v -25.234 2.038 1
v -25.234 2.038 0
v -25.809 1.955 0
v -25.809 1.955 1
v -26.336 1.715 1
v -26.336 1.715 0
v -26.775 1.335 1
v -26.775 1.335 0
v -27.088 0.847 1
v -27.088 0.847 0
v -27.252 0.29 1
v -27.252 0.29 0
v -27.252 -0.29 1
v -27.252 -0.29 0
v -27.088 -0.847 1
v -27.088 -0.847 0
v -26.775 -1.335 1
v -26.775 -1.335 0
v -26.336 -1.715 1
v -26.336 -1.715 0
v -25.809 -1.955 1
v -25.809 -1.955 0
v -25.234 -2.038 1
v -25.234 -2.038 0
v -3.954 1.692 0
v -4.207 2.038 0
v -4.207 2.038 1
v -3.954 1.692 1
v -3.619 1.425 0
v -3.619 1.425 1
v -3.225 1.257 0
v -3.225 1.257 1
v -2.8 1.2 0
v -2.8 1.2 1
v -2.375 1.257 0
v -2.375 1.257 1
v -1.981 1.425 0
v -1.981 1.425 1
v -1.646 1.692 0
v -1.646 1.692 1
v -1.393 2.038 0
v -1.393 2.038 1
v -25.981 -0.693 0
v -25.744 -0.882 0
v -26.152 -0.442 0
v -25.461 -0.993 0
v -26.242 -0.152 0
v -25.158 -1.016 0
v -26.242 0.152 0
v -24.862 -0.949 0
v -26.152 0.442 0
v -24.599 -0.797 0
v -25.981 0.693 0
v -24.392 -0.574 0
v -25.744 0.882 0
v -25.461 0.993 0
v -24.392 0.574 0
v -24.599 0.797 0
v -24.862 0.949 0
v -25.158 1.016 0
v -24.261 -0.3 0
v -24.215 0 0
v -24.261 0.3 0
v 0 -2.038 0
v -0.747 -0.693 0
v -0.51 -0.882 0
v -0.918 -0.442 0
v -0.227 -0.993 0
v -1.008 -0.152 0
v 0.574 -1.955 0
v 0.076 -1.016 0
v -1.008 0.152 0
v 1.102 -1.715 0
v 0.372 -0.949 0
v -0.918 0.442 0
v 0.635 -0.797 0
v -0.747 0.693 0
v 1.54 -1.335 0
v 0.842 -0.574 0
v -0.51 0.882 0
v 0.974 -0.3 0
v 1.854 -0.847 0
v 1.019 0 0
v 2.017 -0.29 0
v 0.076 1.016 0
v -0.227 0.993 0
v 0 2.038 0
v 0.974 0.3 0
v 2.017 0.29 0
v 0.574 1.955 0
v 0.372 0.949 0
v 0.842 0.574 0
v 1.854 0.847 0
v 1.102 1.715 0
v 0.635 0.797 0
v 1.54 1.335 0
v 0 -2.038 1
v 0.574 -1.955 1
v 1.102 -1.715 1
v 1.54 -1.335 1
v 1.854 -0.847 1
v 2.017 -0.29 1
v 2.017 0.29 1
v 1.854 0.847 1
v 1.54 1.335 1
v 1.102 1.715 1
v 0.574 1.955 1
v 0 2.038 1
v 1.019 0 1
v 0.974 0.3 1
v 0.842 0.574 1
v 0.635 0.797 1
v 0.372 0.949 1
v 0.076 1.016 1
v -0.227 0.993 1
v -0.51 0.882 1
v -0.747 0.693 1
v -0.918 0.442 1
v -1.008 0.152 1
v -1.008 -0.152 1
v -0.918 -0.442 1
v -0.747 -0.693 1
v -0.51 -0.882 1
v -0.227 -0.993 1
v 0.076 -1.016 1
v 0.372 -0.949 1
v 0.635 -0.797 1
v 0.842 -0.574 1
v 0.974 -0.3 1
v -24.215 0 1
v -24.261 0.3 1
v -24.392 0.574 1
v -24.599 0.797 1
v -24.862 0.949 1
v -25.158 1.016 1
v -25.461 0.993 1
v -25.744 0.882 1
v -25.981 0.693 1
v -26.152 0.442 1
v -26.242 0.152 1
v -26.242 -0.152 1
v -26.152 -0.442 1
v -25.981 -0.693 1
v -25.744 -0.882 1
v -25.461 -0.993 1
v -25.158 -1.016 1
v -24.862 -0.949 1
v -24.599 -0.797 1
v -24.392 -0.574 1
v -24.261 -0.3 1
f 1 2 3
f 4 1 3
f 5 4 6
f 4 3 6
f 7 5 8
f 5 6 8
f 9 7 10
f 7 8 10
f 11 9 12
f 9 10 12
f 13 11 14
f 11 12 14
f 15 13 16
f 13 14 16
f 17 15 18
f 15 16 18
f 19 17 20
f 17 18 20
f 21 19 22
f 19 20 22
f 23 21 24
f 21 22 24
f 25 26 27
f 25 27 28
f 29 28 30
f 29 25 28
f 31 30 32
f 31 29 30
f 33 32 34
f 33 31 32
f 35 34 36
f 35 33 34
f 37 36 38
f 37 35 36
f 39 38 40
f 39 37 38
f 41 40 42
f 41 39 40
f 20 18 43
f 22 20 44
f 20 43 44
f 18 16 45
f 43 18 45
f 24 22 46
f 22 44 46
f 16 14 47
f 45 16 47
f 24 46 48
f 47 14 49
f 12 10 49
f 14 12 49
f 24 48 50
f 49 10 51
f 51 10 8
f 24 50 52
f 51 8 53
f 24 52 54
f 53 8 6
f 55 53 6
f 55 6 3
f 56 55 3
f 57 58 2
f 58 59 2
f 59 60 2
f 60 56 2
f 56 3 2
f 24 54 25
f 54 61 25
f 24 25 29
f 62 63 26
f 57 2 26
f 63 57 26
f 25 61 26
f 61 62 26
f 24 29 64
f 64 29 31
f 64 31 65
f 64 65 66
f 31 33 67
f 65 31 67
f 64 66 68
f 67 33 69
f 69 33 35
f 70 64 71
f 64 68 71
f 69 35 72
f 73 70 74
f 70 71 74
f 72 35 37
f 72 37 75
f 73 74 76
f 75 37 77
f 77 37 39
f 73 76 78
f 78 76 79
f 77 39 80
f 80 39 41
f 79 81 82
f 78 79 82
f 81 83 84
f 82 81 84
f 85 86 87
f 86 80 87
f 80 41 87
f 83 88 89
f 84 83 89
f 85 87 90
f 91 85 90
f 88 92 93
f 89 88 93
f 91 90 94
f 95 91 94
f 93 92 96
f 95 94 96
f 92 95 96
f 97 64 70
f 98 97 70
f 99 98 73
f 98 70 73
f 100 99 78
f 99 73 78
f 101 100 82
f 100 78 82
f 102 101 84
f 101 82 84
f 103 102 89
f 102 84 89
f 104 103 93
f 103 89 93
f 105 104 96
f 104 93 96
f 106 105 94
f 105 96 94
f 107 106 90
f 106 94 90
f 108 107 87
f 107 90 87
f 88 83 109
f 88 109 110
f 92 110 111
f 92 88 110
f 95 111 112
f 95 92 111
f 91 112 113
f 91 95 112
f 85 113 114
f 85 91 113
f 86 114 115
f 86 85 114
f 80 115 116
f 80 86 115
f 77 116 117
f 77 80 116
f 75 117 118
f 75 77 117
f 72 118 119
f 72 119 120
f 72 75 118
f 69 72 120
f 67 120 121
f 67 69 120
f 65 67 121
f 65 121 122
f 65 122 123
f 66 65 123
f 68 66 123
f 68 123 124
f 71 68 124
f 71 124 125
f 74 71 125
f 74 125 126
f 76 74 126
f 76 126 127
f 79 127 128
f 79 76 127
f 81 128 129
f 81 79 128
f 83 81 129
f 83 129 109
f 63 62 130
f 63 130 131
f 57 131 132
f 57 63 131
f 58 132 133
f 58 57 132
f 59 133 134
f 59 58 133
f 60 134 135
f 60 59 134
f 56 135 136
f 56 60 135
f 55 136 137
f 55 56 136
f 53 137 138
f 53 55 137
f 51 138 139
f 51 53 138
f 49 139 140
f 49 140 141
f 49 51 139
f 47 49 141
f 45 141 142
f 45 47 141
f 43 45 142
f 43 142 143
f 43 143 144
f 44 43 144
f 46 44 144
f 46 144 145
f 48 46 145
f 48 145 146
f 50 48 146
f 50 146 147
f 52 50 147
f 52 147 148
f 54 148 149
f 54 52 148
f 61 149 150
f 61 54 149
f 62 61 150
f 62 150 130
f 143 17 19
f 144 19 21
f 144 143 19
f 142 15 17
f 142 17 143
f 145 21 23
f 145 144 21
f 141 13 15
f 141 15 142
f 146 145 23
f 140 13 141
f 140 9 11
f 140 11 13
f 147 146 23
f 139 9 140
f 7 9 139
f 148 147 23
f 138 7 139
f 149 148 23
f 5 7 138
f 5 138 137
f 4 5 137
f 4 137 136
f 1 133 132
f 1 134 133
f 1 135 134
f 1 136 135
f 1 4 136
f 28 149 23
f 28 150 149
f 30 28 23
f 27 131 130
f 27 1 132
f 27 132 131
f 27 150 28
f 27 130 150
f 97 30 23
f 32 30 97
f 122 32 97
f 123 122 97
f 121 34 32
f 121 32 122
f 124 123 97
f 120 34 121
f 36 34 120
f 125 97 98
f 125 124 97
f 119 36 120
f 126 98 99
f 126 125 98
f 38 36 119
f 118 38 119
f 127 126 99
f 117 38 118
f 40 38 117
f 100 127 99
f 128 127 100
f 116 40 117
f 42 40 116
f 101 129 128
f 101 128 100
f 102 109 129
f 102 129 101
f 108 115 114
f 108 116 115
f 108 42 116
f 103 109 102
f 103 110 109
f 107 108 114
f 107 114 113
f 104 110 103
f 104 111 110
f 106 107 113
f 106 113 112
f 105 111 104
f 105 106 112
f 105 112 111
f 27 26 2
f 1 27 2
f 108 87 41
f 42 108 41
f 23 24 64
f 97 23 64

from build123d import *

# Parameters (mm, degrees)
SKETCH1_R          = 1.01901554
EXTRUDE1_DEPTH     = 1
SKETCH2_R          = 1.6
CUT_EXTRUDE2_DEPTH = 28.366693334


with BuildPart() as part:
    # Sketch1 → Extrude1 (new body)
    with BuildSketch(Plane.XY):
        with BuildLine():
            Line((0, 2.038031079), (-25.234342, 2.038031079))
            ThreePointArc((-25.234342, 2.038031079), (-27.272373079, 0), (-25.234342, -2.038031079))
            Line((-25.234342, -2.038031079), (0, -2.038031079))
            ThreePointArc((0, -2.038031079), (2.038031079, 0), (0, 2.038031079))
        make_face()
        with Locations((-25.234342, 0)):
            Circle(SKETCH1_R, mode=Mode.SUBTRACT)
        Circle(SKETCH1_R, mode=Mode.SUBTRACT)
    extrude(amount=EXTRUDE1_DEPTH)

    # Sketch2 → Cut-Extrude2 (cut, through all)
    with BuildSketch(Plane.XY):
        with Locations((-2.8, 2.8)):
            Circle(SKETCH2_R)
    extrude(amount=CUT_EXTRUDE2_DEPTH, mode=Mode.SUBTRACT)


solid = part.part
